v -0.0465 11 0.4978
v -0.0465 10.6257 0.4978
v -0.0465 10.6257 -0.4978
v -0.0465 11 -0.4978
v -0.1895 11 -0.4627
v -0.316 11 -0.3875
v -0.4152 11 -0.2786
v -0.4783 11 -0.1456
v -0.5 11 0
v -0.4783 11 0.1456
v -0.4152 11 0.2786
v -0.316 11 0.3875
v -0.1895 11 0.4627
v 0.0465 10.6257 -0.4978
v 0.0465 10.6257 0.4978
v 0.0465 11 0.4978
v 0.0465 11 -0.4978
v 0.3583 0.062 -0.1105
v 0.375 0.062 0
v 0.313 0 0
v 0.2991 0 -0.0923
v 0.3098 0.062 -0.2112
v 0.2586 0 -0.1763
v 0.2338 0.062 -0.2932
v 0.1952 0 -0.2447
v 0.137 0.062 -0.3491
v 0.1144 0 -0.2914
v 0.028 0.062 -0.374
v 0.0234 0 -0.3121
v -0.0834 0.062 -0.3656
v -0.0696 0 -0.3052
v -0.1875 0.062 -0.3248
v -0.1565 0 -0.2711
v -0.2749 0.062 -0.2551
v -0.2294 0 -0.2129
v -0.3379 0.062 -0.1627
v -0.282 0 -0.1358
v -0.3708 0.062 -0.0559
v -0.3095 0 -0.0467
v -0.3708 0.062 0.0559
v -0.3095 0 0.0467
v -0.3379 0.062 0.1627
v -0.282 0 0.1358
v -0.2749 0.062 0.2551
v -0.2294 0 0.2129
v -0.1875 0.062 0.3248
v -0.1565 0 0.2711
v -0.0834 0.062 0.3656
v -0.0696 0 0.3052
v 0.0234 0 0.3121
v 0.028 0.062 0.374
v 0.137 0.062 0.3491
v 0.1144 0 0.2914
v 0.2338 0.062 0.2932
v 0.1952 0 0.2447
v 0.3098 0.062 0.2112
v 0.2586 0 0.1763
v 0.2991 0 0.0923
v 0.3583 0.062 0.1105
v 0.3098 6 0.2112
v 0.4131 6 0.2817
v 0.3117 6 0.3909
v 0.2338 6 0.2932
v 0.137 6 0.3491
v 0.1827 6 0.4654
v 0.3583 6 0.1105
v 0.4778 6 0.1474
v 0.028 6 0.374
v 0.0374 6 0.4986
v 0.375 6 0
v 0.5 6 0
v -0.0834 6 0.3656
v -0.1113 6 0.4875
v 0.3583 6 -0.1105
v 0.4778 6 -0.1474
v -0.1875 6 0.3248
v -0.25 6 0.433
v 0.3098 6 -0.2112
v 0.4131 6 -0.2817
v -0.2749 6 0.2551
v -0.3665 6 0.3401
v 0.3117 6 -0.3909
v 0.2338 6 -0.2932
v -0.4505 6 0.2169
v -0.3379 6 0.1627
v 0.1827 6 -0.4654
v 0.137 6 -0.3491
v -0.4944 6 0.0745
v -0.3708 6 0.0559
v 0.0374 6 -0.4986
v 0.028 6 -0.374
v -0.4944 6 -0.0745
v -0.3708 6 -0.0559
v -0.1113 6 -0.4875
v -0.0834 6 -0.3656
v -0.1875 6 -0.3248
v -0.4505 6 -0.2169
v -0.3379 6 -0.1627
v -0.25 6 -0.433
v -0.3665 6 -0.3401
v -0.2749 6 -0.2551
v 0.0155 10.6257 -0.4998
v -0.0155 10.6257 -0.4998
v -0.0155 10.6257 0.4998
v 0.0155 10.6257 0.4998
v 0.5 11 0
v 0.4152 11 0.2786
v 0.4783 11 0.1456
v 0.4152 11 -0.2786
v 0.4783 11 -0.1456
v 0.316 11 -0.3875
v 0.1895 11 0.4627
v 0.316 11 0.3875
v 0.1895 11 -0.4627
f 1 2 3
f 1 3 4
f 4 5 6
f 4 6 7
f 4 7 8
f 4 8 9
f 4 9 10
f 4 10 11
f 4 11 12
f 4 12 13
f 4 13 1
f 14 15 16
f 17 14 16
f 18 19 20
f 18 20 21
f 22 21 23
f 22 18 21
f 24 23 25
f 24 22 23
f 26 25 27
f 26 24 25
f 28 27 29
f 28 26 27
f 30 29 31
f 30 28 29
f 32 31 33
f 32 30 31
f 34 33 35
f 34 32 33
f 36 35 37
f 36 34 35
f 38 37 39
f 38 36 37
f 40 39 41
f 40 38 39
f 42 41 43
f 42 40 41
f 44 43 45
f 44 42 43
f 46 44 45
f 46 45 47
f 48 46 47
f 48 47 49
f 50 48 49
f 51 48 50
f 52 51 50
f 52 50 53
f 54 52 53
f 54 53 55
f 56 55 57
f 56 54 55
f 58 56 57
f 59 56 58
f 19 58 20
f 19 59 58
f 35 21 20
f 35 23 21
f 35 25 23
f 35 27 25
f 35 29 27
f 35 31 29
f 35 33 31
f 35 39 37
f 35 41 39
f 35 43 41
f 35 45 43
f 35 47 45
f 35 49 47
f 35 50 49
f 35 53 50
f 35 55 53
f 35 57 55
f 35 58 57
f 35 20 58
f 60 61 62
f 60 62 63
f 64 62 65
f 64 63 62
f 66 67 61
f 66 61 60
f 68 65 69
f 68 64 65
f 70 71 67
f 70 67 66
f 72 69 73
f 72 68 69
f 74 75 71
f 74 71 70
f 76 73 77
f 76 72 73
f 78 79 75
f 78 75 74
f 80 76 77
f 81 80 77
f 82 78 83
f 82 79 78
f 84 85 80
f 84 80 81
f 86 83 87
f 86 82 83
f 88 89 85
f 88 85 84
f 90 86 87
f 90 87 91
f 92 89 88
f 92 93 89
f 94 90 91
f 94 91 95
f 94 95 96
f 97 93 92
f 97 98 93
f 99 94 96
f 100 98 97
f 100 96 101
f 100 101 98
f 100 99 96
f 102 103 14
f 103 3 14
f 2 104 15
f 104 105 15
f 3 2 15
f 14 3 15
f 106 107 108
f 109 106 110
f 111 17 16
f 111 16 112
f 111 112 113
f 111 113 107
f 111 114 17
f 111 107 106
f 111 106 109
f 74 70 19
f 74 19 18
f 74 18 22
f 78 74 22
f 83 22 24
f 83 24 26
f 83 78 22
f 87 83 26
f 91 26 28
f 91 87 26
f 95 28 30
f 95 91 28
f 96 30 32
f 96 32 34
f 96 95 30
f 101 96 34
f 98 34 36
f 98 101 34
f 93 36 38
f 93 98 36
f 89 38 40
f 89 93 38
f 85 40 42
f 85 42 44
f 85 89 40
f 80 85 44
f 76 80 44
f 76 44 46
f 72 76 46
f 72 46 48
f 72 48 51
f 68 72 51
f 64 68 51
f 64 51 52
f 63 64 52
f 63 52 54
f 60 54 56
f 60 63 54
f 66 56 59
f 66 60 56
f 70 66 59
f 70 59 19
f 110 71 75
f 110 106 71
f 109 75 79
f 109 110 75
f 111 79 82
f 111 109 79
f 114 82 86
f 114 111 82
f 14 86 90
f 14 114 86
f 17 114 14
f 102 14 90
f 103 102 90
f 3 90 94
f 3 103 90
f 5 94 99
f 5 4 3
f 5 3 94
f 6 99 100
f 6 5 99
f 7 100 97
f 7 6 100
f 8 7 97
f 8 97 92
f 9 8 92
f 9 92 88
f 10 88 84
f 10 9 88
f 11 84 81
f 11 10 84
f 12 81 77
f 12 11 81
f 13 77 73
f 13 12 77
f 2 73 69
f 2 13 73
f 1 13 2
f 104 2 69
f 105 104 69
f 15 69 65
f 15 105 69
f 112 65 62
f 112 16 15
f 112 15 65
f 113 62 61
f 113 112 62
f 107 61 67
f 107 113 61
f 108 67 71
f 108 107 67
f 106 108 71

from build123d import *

# Parameters (mm, degrees)
SKETCH2_W               = 0.093
SKETCH2_H               = 0.722554603
CUT_EXTRUDE1_DEPTH      = 1.5
CUT_EXTRUDE1_DEPTH_BACK = 1.5
CHAMFER1_SIZE           = 0.062


with BuildPart() as part:
    # Sketch1 → Revolve1 (revolve)
    with BuildSketch(Plane.XY):
        Polygon((0, 0), (0.375, 0), (0.375, 6), (0.5, 6), (0.5, 11), (0, 11), align=None)
    revolve(axis=Axis((0, -1.490059703, 0), (0, 1, 0)))

    # Sketch2 → Cut-Extrude1 (cut, two sides)
    with BuildSketch(Plane.XY) as cut_extrude1_sk:
        with Locations((0, 10.987009479)):
            Rectangle(SKETCH2_W, SKETCH2_H)
    extrude(amount=CUT_EXTRUDE1_DEPTH, mode=Mode.SUBTRACT)
    extrude(cut_extrude1_sk.sketch, amount=-CUT_EXTRUDE1_DEPTH_BACK, mode=Mode.SUBTRACT)

    # Chamfer1
    chamfer1_edges = [part.edges().sort_by_distance(p)[0] for p in [
        (-0.375, 0, 0),
    ]]
    chamfer(chamfer1_edges, length=CHAMFER1_SIZE)


solid = part.part
